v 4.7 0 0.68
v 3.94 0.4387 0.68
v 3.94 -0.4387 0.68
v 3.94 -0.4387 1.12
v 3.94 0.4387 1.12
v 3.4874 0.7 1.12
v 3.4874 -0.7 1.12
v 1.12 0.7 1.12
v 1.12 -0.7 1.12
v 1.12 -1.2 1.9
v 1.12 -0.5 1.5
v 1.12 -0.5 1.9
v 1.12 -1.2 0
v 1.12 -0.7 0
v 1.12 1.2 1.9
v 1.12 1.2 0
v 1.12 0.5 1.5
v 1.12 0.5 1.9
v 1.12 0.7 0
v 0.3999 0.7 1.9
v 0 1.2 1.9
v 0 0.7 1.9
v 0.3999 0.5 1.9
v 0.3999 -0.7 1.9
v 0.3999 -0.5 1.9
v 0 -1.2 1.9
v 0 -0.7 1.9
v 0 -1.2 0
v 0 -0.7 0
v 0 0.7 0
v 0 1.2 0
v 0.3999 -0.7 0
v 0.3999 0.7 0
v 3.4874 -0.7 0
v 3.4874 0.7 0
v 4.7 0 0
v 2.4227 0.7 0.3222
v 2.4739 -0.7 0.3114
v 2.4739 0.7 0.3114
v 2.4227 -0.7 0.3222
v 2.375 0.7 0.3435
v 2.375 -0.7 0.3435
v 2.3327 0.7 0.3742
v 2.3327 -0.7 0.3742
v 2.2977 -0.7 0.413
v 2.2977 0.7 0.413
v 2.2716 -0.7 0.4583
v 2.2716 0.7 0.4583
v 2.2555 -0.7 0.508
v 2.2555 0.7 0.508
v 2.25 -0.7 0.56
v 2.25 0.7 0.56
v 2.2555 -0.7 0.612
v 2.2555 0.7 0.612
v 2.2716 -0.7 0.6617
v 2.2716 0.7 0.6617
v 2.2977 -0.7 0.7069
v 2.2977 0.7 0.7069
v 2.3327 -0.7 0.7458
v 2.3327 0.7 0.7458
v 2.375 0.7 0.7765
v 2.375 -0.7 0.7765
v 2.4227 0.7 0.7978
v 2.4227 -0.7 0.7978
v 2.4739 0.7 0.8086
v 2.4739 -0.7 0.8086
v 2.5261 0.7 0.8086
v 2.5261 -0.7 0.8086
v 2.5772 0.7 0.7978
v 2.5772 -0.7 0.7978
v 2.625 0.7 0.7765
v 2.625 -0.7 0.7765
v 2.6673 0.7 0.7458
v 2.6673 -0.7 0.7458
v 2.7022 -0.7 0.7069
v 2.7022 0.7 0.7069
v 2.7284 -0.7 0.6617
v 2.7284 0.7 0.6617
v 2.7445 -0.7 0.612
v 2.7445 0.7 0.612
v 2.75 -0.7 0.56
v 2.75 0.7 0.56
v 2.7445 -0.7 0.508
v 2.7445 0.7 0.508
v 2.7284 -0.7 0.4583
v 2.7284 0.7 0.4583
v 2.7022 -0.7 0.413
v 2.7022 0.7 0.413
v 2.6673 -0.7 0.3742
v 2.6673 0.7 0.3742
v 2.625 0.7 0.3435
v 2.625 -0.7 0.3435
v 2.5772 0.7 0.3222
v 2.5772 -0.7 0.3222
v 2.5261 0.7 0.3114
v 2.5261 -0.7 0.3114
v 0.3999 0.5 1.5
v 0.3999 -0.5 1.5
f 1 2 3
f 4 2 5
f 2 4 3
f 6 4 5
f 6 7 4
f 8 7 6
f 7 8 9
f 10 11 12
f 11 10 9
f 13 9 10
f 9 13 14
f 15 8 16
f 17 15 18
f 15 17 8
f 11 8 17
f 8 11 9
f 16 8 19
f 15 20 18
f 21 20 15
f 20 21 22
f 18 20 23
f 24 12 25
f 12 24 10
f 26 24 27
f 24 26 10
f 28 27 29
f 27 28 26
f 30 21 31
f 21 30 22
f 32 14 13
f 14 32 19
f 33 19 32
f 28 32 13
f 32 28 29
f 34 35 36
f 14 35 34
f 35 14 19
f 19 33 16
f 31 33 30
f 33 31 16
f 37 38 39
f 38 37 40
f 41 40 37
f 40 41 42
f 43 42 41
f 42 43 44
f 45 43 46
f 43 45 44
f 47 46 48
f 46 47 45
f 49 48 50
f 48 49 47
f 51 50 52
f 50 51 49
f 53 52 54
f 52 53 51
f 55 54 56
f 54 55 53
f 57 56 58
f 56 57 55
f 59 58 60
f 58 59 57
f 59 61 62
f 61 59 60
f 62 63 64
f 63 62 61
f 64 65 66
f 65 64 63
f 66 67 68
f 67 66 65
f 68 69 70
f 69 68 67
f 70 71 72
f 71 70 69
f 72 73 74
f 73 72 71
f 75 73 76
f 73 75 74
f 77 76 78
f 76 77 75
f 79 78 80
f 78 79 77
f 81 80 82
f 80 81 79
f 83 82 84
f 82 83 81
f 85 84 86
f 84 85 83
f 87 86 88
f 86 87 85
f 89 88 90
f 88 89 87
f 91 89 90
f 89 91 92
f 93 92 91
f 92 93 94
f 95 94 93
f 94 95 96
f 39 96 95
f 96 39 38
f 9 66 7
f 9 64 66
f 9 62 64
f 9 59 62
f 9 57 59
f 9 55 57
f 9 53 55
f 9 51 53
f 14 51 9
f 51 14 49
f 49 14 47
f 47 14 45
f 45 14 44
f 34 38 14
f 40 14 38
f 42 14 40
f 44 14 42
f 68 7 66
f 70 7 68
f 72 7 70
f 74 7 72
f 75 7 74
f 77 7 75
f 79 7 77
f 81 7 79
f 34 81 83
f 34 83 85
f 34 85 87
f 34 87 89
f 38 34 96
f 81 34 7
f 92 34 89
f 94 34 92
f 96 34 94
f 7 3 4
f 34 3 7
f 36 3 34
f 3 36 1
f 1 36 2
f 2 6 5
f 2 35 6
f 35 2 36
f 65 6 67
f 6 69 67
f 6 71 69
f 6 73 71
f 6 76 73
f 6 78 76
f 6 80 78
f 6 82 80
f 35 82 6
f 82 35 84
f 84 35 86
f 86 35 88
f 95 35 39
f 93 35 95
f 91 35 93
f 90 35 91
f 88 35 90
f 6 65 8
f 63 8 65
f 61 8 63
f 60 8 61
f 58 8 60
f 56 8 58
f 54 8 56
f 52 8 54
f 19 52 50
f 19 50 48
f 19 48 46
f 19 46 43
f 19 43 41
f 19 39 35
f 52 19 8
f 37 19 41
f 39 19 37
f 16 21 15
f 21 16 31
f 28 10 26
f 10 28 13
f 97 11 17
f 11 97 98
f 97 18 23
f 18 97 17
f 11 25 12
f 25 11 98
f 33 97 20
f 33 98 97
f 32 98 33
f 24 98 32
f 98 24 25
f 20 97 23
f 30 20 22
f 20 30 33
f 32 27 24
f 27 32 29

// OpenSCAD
$fn=30;
difference(){
intersection(convexity=40)
{
 

rotate([90,0,0]) linear_extrude(2.4,center=true,convexity=40)difference(){

 {polygon([[0,0],[4.7,0],[4.7,1.12-.44],[3.94,1.12-.44],[3.94,1.12],[1.12,1.12],[1.12,1.9],[0,1.9]]);
translate([2.5,.56])circle(0.25);
}}

linear_extrude(1.9)polygon([[0,1.2],[1.12,1.2],[1.12,0.7],[  3.4874,0.7],[4.7,0],[  3.4874,-0.7], [1.12,-0.7],[1.12,-1.2],[0,-1.2]]);

}



translate([.8,0,2])cube(1,center=true);
translate([0.1999,0,0.9999])cube([0.4,01.4,2],center=true);

}
